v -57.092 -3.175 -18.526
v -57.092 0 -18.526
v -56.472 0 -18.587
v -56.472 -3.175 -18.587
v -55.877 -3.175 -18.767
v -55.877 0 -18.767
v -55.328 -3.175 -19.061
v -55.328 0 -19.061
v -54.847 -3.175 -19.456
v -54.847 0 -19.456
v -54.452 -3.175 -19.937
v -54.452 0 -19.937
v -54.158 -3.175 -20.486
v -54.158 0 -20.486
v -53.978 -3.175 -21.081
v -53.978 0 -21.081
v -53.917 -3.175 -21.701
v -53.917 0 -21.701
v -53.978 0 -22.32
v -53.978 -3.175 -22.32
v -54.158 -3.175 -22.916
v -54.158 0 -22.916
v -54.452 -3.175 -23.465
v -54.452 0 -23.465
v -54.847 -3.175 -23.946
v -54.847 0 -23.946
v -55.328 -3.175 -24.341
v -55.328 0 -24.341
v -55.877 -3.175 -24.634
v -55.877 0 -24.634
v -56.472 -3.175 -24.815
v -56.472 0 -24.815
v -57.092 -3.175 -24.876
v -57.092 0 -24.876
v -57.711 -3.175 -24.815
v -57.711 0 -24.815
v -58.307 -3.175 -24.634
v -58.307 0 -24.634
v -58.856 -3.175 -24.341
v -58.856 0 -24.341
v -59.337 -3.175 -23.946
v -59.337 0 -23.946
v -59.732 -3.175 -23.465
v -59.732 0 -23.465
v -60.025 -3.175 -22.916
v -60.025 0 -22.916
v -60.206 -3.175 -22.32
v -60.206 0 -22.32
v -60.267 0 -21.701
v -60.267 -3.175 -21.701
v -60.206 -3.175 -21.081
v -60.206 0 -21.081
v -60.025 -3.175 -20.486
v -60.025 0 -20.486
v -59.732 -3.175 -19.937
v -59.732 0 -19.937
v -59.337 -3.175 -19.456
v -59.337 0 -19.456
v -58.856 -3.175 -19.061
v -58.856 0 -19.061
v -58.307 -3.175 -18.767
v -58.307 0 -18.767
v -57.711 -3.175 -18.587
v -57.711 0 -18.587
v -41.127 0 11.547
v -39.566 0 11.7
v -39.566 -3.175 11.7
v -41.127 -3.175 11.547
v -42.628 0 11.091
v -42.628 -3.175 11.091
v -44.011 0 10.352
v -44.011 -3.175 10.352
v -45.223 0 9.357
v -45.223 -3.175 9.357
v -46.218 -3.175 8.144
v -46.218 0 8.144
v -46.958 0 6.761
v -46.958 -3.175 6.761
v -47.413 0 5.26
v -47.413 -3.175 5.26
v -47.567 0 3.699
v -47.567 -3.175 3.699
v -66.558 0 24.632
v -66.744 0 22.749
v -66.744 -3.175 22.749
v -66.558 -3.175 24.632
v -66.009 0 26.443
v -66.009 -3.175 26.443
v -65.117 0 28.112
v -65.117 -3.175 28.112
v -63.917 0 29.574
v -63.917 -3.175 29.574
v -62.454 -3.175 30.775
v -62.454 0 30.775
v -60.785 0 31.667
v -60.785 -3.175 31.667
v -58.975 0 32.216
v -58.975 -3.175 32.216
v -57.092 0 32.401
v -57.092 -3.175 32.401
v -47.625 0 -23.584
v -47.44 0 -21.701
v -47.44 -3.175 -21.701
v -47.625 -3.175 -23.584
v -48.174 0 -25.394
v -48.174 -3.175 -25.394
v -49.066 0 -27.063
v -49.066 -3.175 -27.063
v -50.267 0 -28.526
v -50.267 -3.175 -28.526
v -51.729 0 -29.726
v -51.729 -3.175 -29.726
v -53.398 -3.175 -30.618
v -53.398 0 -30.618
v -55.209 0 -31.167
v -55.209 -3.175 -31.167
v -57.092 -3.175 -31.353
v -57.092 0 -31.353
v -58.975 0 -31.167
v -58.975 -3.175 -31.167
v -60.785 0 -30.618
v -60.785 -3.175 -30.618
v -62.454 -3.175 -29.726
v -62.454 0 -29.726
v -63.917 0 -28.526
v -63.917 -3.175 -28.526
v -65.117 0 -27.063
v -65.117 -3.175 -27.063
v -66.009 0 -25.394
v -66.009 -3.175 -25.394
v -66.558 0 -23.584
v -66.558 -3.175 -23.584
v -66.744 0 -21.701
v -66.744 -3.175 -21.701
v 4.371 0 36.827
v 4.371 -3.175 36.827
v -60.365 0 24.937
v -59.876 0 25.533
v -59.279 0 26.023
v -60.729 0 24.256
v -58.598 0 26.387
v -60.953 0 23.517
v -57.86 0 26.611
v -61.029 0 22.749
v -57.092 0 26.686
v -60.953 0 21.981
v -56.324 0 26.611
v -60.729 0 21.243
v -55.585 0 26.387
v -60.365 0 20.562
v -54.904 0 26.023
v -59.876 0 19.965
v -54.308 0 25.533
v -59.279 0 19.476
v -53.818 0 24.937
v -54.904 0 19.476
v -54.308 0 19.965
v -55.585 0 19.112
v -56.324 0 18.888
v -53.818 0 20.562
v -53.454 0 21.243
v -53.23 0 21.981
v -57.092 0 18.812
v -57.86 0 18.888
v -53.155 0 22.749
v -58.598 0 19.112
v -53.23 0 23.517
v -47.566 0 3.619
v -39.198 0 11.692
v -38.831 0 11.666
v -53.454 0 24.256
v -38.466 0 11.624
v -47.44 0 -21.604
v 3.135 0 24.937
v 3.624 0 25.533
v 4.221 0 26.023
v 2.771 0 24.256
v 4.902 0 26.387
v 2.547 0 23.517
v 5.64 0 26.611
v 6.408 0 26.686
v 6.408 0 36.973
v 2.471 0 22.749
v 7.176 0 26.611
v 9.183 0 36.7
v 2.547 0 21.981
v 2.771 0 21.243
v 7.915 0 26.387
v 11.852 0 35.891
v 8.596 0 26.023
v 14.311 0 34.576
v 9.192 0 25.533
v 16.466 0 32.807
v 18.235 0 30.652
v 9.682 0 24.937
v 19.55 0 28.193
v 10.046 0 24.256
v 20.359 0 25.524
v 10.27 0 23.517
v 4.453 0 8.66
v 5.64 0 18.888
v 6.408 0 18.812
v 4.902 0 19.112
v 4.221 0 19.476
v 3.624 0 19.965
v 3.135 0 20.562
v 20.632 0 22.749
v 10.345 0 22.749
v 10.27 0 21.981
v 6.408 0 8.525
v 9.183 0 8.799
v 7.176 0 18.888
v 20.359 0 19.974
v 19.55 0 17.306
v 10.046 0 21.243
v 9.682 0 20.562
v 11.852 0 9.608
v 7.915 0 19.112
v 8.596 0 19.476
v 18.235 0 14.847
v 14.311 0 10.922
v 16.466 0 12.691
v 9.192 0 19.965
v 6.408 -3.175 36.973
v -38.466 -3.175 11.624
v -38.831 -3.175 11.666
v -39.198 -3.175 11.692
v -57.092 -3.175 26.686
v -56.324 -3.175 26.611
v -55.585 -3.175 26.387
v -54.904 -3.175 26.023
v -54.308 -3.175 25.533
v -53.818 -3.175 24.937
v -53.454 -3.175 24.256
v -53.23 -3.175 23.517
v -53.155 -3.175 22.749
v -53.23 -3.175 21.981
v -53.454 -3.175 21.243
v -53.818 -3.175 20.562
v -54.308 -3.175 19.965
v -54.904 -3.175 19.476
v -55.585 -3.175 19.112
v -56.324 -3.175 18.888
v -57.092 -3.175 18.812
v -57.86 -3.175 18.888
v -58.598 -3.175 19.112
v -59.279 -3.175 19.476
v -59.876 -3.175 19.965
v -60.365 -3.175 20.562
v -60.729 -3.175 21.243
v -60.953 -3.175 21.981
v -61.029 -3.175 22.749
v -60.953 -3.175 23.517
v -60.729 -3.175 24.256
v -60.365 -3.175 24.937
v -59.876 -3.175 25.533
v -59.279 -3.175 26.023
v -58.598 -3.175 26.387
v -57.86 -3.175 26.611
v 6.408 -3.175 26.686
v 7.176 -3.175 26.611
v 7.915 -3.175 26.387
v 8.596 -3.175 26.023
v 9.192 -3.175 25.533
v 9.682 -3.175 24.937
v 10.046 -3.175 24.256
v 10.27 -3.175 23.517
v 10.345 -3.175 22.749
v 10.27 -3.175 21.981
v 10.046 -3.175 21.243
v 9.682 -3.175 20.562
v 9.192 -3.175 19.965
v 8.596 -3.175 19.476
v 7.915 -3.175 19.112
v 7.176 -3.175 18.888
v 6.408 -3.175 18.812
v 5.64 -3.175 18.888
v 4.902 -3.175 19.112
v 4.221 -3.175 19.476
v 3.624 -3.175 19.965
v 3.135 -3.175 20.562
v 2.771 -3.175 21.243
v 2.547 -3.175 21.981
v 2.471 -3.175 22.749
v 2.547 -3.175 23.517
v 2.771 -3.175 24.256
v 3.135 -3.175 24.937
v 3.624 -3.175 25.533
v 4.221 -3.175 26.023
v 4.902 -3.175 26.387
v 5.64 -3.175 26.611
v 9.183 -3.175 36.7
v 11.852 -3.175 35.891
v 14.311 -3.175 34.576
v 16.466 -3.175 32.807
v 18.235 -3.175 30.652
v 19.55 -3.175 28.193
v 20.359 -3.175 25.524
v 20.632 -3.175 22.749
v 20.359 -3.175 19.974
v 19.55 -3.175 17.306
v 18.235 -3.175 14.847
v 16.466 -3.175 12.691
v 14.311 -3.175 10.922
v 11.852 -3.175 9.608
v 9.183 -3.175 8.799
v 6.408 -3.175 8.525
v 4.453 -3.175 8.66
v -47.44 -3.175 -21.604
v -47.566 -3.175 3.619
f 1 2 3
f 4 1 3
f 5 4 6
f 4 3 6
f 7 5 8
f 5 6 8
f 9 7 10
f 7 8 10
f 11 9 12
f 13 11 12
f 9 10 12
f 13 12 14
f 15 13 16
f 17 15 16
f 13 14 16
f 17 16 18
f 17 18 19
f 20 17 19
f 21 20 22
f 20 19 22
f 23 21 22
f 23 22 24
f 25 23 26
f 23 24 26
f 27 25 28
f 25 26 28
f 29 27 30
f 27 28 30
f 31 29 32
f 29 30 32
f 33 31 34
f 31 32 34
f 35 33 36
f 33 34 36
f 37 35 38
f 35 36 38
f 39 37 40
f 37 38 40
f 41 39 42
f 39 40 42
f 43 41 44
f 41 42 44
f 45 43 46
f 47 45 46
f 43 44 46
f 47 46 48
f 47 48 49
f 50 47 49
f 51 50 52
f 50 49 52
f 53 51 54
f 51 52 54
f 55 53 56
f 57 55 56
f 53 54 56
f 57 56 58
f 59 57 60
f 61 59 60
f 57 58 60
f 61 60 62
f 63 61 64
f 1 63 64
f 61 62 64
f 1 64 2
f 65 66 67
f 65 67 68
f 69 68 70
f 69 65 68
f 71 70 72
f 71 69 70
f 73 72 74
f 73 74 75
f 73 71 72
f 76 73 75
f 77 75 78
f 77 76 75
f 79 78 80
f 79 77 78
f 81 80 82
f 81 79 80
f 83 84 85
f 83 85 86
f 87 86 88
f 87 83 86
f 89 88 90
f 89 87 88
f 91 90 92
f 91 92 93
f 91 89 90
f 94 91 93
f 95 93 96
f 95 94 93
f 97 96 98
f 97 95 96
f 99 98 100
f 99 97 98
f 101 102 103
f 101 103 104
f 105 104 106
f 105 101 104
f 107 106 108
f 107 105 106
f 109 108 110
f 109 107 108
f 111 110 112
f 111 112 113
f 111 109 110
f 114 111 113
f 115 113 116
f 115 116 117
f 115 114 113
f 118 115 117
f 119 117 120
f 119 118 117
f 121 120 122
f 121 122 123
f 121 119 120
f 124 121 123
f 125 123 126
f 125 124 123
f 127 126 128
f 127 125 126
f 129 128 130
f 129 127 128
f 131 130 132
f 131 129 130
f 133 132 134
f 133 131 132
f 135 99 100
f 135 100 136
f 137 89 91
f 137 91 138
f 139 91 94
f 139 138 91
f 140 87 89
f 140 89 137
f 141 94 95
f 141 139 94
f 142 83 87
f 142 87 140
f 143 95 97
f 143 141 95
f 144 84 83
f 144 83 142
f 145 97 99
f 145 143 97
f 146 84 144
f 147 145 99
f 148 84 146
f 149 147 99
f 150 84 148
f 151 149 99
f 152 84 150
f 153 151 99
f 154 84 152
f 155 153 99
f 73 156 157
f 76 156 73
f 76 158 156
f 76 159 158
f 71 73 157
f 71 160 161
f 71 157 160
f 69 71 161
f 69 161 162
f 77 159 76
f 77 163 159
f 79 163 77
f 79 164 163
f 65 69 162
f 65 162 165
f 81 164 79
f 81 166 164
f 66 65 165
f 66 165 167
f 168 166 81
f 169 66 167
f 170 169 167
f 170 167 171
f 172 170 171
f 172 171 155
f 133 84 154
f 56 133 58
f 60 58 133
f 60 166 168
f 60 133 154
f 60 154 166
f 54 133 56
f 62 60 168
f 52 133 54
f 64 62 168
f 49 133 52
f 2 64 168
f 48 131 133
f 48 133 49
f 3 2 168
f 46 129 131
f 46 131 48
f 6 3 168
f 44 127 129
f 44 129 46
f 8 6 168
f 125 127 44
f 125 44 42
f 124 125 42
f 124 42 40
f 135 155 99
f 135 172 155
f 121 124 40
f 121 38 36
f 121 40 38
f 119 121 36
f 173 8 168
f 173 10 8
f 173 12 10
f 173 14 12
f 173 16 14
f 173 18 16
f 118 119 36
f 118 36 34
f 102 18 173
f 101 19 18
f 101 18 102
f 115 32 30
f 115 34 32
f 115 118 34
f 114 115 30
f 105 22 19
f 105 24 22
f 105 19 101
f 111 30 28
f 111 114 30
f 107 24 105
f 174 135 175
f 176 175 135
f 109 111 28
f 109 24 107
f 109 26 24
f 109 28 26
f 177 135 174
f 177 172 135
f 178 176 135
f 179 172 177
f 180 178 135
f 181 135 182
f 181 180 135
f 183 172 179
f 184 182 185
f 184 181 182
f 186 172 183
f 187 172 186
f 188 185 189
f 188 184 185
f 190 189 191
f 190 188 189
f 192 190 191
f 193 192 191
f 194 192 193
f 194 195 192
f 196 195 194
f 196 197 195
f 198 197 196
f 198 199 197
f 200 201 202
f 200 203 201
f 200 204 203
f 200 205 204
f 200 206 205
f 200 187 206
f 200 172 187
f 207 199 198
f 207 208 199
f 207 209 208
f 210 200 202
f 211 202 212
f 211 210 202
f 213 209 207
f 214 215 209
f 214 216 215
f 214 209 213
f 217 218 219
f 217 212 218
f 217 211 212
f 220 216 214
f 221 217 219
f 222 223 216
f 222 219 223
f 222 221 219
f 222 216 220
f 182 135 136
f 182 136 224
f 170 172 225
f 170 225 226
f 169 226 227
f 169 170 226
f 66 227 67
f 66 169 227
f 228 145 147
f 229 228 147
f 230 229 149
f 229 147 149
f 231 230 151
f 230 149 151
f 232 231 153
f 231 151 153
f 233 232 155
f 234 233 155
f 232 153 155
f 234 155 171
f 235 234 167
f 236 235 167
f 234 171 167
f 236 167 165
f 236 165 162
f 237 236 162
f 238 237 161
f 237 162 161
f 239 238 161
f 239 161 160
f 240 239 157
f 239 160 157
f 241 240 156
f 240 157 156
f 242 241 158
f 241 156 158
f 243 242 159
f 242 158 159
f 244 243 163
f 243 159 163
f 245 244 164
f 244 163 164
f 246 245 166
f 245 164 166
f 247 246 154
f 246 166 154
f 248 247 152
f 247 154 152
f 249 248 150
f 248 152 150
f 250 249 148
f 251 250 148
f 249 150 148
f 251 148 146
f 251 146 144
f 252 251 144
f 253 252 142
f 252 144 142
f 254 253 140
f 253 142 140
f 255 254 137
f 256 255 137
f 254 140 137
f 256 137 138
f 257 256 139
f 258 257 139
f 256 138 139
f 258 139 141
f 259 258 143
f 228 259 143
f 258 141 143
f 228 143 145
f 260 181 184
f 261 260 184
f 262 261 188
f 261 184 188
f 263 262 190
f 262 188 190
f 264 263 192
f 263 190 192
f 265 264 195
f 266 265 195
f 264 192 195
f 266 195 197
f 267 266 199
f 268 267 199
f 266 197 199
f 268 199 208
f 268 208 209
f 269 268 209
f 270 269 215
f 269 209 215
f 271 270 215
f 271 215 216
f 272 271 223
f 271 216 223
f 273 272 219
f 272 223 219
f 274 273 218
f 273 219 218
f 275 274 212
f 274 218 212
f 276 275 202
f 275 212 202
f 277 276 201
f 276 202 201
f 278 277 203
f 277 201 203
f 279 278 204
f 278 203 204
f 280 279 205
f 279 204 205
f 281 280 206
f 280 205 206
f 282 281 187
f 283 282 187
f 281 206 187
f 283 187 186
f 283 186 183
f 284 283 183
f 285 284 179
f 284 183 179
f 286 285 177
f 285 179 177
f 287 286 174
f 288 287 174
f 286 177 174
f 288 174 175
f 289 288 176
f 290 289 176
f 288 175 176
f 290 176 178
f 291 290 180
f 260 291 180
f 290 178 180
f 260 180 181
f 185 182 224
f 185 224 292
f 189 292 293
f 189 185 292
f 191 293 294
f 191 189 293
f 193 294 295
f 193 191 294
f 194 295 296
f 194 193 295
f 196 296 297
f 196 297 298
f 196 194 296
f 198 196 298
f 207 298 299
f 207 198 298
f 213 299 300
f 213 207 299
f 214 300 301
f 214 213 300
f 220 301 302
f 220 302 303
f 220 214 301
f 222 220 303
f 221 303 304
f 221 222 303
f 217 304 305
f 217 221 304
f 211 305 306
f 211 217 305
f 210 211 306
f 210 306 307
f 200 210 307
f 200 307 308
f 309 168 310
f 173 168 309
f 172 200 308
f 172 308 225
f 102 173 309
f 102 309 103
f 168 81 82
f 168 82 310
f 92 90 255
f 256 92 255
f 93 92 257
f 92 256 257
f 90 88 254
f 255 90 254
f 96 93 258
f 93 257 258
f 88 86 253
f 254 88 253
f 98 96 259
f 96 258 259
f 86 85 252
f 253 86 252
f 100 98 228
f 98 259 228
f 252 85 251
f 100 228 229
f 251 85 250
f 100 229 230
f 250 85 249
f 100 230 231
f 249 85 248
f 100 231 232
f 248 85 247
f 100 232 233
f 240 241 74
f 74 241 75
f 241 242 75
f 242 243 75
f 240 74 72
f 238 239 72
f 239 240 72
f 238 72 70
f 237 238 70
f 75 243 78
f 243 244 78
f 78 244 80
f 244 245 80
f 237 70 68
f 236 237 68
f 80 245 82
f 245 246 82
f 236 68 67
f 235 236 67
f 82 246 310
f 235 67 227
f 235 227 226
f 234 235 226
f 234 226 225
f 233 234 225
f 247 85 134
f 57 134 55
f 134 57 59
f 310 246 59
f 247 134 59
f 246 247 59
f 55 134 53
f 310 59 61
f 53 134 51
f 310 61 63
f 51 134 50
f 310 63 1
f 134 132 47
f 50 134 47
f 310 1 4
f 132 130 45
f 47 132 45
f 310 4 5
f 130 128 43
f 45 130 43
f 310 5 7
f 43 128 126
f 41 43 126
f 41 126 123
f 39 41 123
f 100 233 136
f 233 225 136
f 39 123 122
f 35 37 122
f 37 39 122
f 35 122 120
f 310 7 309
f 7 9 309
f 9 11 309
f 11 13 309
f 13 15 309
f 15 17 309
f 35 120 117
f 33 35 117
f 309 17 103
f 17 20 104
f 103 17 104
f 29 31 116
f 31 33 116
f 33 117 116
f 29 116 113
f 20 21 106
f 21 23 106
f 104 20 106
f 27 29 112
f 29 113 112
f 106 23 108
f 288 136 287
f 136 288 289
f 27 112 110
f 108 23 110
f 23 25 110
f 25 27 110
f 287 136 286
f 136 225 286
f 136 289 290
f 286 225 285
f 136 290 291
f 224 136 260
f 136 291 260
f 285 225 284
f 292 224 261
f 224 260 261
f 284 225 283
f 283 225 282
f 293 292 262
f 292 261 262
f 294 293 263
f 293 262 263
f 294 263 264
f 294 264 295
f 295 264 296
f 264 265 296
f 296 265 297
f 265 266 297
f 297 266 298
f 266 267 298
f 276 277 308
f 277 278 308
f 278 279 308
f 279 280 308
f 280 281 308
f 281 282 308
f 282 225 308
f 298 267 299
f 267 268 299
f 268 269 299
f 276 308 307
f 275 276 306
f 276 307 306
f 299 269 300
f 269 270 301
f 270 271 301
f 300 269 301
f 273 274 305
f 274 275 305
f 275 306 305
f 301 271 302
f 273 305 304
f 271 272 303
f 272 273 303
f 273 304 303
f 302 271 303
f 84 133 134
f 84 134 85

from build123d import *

# Parameters (mm, degrees)
SKETCH1_R           = 3.937
SKETCH1_R_2         = 3.175
BOSS_EXTRUDE1_DEPTH = 3.175


with BuildPart() as part:
    # Sketch1 → Boss-Extrude1 (new body)
    with BuildSketch(Plane(origin=(0, 0, 0), x_dir=(1, 0, 0), z_dir=(0, 1, 0))):
        with BuildLine():
            ThreePointArc((-47.439743119, 21.70075638), (-57.091743119, 31.35275638), (-66.743743119, 21.70075638))
            Line((-66.743743119, 21.70075638), (-66.743743119, -22.74924362))
            ThreePointArc((-66.743743119, -22.74924362), (-63.916737771, -29.574238272), (-57.091743119, -32.40124362))
            Line((-57.091743119, -32.40124362), (4.370564279, -36.826529753))
            Line((4.370564279, -36.826529753), (6.408256881, -36.97324362))
            ThreePointArc((6.408256881, -36.97324362), (20.632256881, -22.74924362), (6.408256881, -8.52524362))
            Line((6.408256881, -8.52524362), (4.452941658, -8.660279201))
            Line((4.452941658, -8.660279201), (-38.465878307, -11.624286105))
            ThreePointArc((-38.465878307, -11.624286105), (-39.014500852, -11.681231653), (-39.565743119, -11.70024362))
            ThreePointArc((-39.565743119, -11.70024362), (-45.223304476, -9.356804976), (-47.566743119, -3.69924362))
            Line((-47.566743119, -3.69924362), (-47.566343079, -3.61923562))
            Line((-47.566343079, -3.61923562), (-47.440225707, 21.604238793))
            Line((-47.440225707, 21.604238793), (-47.439743119, 21.70075638))
        make_face()
        with Locations(Location((-57.091743119, -22.74924362, 0), (0, 0, 270))):
            Circle(SKETCH1_R, mode=Mode.SUBTRACT)
        with Locations(Location((6.408256881, -22.74924362, 0), (0, 0, 270))):
            Circle(SKETCH1_R, mode=Mode.SUBTRACT)
        with Locations(Location((-57.091743119, 21.70075638, 0), (0, 0, 270))):
            Circle(SKETCH1_R_2, mode=Mode.SUBTRACT)
    extrude(amount=-BOSS_EXTRUDE1_DEPTH)


solid = part.part
